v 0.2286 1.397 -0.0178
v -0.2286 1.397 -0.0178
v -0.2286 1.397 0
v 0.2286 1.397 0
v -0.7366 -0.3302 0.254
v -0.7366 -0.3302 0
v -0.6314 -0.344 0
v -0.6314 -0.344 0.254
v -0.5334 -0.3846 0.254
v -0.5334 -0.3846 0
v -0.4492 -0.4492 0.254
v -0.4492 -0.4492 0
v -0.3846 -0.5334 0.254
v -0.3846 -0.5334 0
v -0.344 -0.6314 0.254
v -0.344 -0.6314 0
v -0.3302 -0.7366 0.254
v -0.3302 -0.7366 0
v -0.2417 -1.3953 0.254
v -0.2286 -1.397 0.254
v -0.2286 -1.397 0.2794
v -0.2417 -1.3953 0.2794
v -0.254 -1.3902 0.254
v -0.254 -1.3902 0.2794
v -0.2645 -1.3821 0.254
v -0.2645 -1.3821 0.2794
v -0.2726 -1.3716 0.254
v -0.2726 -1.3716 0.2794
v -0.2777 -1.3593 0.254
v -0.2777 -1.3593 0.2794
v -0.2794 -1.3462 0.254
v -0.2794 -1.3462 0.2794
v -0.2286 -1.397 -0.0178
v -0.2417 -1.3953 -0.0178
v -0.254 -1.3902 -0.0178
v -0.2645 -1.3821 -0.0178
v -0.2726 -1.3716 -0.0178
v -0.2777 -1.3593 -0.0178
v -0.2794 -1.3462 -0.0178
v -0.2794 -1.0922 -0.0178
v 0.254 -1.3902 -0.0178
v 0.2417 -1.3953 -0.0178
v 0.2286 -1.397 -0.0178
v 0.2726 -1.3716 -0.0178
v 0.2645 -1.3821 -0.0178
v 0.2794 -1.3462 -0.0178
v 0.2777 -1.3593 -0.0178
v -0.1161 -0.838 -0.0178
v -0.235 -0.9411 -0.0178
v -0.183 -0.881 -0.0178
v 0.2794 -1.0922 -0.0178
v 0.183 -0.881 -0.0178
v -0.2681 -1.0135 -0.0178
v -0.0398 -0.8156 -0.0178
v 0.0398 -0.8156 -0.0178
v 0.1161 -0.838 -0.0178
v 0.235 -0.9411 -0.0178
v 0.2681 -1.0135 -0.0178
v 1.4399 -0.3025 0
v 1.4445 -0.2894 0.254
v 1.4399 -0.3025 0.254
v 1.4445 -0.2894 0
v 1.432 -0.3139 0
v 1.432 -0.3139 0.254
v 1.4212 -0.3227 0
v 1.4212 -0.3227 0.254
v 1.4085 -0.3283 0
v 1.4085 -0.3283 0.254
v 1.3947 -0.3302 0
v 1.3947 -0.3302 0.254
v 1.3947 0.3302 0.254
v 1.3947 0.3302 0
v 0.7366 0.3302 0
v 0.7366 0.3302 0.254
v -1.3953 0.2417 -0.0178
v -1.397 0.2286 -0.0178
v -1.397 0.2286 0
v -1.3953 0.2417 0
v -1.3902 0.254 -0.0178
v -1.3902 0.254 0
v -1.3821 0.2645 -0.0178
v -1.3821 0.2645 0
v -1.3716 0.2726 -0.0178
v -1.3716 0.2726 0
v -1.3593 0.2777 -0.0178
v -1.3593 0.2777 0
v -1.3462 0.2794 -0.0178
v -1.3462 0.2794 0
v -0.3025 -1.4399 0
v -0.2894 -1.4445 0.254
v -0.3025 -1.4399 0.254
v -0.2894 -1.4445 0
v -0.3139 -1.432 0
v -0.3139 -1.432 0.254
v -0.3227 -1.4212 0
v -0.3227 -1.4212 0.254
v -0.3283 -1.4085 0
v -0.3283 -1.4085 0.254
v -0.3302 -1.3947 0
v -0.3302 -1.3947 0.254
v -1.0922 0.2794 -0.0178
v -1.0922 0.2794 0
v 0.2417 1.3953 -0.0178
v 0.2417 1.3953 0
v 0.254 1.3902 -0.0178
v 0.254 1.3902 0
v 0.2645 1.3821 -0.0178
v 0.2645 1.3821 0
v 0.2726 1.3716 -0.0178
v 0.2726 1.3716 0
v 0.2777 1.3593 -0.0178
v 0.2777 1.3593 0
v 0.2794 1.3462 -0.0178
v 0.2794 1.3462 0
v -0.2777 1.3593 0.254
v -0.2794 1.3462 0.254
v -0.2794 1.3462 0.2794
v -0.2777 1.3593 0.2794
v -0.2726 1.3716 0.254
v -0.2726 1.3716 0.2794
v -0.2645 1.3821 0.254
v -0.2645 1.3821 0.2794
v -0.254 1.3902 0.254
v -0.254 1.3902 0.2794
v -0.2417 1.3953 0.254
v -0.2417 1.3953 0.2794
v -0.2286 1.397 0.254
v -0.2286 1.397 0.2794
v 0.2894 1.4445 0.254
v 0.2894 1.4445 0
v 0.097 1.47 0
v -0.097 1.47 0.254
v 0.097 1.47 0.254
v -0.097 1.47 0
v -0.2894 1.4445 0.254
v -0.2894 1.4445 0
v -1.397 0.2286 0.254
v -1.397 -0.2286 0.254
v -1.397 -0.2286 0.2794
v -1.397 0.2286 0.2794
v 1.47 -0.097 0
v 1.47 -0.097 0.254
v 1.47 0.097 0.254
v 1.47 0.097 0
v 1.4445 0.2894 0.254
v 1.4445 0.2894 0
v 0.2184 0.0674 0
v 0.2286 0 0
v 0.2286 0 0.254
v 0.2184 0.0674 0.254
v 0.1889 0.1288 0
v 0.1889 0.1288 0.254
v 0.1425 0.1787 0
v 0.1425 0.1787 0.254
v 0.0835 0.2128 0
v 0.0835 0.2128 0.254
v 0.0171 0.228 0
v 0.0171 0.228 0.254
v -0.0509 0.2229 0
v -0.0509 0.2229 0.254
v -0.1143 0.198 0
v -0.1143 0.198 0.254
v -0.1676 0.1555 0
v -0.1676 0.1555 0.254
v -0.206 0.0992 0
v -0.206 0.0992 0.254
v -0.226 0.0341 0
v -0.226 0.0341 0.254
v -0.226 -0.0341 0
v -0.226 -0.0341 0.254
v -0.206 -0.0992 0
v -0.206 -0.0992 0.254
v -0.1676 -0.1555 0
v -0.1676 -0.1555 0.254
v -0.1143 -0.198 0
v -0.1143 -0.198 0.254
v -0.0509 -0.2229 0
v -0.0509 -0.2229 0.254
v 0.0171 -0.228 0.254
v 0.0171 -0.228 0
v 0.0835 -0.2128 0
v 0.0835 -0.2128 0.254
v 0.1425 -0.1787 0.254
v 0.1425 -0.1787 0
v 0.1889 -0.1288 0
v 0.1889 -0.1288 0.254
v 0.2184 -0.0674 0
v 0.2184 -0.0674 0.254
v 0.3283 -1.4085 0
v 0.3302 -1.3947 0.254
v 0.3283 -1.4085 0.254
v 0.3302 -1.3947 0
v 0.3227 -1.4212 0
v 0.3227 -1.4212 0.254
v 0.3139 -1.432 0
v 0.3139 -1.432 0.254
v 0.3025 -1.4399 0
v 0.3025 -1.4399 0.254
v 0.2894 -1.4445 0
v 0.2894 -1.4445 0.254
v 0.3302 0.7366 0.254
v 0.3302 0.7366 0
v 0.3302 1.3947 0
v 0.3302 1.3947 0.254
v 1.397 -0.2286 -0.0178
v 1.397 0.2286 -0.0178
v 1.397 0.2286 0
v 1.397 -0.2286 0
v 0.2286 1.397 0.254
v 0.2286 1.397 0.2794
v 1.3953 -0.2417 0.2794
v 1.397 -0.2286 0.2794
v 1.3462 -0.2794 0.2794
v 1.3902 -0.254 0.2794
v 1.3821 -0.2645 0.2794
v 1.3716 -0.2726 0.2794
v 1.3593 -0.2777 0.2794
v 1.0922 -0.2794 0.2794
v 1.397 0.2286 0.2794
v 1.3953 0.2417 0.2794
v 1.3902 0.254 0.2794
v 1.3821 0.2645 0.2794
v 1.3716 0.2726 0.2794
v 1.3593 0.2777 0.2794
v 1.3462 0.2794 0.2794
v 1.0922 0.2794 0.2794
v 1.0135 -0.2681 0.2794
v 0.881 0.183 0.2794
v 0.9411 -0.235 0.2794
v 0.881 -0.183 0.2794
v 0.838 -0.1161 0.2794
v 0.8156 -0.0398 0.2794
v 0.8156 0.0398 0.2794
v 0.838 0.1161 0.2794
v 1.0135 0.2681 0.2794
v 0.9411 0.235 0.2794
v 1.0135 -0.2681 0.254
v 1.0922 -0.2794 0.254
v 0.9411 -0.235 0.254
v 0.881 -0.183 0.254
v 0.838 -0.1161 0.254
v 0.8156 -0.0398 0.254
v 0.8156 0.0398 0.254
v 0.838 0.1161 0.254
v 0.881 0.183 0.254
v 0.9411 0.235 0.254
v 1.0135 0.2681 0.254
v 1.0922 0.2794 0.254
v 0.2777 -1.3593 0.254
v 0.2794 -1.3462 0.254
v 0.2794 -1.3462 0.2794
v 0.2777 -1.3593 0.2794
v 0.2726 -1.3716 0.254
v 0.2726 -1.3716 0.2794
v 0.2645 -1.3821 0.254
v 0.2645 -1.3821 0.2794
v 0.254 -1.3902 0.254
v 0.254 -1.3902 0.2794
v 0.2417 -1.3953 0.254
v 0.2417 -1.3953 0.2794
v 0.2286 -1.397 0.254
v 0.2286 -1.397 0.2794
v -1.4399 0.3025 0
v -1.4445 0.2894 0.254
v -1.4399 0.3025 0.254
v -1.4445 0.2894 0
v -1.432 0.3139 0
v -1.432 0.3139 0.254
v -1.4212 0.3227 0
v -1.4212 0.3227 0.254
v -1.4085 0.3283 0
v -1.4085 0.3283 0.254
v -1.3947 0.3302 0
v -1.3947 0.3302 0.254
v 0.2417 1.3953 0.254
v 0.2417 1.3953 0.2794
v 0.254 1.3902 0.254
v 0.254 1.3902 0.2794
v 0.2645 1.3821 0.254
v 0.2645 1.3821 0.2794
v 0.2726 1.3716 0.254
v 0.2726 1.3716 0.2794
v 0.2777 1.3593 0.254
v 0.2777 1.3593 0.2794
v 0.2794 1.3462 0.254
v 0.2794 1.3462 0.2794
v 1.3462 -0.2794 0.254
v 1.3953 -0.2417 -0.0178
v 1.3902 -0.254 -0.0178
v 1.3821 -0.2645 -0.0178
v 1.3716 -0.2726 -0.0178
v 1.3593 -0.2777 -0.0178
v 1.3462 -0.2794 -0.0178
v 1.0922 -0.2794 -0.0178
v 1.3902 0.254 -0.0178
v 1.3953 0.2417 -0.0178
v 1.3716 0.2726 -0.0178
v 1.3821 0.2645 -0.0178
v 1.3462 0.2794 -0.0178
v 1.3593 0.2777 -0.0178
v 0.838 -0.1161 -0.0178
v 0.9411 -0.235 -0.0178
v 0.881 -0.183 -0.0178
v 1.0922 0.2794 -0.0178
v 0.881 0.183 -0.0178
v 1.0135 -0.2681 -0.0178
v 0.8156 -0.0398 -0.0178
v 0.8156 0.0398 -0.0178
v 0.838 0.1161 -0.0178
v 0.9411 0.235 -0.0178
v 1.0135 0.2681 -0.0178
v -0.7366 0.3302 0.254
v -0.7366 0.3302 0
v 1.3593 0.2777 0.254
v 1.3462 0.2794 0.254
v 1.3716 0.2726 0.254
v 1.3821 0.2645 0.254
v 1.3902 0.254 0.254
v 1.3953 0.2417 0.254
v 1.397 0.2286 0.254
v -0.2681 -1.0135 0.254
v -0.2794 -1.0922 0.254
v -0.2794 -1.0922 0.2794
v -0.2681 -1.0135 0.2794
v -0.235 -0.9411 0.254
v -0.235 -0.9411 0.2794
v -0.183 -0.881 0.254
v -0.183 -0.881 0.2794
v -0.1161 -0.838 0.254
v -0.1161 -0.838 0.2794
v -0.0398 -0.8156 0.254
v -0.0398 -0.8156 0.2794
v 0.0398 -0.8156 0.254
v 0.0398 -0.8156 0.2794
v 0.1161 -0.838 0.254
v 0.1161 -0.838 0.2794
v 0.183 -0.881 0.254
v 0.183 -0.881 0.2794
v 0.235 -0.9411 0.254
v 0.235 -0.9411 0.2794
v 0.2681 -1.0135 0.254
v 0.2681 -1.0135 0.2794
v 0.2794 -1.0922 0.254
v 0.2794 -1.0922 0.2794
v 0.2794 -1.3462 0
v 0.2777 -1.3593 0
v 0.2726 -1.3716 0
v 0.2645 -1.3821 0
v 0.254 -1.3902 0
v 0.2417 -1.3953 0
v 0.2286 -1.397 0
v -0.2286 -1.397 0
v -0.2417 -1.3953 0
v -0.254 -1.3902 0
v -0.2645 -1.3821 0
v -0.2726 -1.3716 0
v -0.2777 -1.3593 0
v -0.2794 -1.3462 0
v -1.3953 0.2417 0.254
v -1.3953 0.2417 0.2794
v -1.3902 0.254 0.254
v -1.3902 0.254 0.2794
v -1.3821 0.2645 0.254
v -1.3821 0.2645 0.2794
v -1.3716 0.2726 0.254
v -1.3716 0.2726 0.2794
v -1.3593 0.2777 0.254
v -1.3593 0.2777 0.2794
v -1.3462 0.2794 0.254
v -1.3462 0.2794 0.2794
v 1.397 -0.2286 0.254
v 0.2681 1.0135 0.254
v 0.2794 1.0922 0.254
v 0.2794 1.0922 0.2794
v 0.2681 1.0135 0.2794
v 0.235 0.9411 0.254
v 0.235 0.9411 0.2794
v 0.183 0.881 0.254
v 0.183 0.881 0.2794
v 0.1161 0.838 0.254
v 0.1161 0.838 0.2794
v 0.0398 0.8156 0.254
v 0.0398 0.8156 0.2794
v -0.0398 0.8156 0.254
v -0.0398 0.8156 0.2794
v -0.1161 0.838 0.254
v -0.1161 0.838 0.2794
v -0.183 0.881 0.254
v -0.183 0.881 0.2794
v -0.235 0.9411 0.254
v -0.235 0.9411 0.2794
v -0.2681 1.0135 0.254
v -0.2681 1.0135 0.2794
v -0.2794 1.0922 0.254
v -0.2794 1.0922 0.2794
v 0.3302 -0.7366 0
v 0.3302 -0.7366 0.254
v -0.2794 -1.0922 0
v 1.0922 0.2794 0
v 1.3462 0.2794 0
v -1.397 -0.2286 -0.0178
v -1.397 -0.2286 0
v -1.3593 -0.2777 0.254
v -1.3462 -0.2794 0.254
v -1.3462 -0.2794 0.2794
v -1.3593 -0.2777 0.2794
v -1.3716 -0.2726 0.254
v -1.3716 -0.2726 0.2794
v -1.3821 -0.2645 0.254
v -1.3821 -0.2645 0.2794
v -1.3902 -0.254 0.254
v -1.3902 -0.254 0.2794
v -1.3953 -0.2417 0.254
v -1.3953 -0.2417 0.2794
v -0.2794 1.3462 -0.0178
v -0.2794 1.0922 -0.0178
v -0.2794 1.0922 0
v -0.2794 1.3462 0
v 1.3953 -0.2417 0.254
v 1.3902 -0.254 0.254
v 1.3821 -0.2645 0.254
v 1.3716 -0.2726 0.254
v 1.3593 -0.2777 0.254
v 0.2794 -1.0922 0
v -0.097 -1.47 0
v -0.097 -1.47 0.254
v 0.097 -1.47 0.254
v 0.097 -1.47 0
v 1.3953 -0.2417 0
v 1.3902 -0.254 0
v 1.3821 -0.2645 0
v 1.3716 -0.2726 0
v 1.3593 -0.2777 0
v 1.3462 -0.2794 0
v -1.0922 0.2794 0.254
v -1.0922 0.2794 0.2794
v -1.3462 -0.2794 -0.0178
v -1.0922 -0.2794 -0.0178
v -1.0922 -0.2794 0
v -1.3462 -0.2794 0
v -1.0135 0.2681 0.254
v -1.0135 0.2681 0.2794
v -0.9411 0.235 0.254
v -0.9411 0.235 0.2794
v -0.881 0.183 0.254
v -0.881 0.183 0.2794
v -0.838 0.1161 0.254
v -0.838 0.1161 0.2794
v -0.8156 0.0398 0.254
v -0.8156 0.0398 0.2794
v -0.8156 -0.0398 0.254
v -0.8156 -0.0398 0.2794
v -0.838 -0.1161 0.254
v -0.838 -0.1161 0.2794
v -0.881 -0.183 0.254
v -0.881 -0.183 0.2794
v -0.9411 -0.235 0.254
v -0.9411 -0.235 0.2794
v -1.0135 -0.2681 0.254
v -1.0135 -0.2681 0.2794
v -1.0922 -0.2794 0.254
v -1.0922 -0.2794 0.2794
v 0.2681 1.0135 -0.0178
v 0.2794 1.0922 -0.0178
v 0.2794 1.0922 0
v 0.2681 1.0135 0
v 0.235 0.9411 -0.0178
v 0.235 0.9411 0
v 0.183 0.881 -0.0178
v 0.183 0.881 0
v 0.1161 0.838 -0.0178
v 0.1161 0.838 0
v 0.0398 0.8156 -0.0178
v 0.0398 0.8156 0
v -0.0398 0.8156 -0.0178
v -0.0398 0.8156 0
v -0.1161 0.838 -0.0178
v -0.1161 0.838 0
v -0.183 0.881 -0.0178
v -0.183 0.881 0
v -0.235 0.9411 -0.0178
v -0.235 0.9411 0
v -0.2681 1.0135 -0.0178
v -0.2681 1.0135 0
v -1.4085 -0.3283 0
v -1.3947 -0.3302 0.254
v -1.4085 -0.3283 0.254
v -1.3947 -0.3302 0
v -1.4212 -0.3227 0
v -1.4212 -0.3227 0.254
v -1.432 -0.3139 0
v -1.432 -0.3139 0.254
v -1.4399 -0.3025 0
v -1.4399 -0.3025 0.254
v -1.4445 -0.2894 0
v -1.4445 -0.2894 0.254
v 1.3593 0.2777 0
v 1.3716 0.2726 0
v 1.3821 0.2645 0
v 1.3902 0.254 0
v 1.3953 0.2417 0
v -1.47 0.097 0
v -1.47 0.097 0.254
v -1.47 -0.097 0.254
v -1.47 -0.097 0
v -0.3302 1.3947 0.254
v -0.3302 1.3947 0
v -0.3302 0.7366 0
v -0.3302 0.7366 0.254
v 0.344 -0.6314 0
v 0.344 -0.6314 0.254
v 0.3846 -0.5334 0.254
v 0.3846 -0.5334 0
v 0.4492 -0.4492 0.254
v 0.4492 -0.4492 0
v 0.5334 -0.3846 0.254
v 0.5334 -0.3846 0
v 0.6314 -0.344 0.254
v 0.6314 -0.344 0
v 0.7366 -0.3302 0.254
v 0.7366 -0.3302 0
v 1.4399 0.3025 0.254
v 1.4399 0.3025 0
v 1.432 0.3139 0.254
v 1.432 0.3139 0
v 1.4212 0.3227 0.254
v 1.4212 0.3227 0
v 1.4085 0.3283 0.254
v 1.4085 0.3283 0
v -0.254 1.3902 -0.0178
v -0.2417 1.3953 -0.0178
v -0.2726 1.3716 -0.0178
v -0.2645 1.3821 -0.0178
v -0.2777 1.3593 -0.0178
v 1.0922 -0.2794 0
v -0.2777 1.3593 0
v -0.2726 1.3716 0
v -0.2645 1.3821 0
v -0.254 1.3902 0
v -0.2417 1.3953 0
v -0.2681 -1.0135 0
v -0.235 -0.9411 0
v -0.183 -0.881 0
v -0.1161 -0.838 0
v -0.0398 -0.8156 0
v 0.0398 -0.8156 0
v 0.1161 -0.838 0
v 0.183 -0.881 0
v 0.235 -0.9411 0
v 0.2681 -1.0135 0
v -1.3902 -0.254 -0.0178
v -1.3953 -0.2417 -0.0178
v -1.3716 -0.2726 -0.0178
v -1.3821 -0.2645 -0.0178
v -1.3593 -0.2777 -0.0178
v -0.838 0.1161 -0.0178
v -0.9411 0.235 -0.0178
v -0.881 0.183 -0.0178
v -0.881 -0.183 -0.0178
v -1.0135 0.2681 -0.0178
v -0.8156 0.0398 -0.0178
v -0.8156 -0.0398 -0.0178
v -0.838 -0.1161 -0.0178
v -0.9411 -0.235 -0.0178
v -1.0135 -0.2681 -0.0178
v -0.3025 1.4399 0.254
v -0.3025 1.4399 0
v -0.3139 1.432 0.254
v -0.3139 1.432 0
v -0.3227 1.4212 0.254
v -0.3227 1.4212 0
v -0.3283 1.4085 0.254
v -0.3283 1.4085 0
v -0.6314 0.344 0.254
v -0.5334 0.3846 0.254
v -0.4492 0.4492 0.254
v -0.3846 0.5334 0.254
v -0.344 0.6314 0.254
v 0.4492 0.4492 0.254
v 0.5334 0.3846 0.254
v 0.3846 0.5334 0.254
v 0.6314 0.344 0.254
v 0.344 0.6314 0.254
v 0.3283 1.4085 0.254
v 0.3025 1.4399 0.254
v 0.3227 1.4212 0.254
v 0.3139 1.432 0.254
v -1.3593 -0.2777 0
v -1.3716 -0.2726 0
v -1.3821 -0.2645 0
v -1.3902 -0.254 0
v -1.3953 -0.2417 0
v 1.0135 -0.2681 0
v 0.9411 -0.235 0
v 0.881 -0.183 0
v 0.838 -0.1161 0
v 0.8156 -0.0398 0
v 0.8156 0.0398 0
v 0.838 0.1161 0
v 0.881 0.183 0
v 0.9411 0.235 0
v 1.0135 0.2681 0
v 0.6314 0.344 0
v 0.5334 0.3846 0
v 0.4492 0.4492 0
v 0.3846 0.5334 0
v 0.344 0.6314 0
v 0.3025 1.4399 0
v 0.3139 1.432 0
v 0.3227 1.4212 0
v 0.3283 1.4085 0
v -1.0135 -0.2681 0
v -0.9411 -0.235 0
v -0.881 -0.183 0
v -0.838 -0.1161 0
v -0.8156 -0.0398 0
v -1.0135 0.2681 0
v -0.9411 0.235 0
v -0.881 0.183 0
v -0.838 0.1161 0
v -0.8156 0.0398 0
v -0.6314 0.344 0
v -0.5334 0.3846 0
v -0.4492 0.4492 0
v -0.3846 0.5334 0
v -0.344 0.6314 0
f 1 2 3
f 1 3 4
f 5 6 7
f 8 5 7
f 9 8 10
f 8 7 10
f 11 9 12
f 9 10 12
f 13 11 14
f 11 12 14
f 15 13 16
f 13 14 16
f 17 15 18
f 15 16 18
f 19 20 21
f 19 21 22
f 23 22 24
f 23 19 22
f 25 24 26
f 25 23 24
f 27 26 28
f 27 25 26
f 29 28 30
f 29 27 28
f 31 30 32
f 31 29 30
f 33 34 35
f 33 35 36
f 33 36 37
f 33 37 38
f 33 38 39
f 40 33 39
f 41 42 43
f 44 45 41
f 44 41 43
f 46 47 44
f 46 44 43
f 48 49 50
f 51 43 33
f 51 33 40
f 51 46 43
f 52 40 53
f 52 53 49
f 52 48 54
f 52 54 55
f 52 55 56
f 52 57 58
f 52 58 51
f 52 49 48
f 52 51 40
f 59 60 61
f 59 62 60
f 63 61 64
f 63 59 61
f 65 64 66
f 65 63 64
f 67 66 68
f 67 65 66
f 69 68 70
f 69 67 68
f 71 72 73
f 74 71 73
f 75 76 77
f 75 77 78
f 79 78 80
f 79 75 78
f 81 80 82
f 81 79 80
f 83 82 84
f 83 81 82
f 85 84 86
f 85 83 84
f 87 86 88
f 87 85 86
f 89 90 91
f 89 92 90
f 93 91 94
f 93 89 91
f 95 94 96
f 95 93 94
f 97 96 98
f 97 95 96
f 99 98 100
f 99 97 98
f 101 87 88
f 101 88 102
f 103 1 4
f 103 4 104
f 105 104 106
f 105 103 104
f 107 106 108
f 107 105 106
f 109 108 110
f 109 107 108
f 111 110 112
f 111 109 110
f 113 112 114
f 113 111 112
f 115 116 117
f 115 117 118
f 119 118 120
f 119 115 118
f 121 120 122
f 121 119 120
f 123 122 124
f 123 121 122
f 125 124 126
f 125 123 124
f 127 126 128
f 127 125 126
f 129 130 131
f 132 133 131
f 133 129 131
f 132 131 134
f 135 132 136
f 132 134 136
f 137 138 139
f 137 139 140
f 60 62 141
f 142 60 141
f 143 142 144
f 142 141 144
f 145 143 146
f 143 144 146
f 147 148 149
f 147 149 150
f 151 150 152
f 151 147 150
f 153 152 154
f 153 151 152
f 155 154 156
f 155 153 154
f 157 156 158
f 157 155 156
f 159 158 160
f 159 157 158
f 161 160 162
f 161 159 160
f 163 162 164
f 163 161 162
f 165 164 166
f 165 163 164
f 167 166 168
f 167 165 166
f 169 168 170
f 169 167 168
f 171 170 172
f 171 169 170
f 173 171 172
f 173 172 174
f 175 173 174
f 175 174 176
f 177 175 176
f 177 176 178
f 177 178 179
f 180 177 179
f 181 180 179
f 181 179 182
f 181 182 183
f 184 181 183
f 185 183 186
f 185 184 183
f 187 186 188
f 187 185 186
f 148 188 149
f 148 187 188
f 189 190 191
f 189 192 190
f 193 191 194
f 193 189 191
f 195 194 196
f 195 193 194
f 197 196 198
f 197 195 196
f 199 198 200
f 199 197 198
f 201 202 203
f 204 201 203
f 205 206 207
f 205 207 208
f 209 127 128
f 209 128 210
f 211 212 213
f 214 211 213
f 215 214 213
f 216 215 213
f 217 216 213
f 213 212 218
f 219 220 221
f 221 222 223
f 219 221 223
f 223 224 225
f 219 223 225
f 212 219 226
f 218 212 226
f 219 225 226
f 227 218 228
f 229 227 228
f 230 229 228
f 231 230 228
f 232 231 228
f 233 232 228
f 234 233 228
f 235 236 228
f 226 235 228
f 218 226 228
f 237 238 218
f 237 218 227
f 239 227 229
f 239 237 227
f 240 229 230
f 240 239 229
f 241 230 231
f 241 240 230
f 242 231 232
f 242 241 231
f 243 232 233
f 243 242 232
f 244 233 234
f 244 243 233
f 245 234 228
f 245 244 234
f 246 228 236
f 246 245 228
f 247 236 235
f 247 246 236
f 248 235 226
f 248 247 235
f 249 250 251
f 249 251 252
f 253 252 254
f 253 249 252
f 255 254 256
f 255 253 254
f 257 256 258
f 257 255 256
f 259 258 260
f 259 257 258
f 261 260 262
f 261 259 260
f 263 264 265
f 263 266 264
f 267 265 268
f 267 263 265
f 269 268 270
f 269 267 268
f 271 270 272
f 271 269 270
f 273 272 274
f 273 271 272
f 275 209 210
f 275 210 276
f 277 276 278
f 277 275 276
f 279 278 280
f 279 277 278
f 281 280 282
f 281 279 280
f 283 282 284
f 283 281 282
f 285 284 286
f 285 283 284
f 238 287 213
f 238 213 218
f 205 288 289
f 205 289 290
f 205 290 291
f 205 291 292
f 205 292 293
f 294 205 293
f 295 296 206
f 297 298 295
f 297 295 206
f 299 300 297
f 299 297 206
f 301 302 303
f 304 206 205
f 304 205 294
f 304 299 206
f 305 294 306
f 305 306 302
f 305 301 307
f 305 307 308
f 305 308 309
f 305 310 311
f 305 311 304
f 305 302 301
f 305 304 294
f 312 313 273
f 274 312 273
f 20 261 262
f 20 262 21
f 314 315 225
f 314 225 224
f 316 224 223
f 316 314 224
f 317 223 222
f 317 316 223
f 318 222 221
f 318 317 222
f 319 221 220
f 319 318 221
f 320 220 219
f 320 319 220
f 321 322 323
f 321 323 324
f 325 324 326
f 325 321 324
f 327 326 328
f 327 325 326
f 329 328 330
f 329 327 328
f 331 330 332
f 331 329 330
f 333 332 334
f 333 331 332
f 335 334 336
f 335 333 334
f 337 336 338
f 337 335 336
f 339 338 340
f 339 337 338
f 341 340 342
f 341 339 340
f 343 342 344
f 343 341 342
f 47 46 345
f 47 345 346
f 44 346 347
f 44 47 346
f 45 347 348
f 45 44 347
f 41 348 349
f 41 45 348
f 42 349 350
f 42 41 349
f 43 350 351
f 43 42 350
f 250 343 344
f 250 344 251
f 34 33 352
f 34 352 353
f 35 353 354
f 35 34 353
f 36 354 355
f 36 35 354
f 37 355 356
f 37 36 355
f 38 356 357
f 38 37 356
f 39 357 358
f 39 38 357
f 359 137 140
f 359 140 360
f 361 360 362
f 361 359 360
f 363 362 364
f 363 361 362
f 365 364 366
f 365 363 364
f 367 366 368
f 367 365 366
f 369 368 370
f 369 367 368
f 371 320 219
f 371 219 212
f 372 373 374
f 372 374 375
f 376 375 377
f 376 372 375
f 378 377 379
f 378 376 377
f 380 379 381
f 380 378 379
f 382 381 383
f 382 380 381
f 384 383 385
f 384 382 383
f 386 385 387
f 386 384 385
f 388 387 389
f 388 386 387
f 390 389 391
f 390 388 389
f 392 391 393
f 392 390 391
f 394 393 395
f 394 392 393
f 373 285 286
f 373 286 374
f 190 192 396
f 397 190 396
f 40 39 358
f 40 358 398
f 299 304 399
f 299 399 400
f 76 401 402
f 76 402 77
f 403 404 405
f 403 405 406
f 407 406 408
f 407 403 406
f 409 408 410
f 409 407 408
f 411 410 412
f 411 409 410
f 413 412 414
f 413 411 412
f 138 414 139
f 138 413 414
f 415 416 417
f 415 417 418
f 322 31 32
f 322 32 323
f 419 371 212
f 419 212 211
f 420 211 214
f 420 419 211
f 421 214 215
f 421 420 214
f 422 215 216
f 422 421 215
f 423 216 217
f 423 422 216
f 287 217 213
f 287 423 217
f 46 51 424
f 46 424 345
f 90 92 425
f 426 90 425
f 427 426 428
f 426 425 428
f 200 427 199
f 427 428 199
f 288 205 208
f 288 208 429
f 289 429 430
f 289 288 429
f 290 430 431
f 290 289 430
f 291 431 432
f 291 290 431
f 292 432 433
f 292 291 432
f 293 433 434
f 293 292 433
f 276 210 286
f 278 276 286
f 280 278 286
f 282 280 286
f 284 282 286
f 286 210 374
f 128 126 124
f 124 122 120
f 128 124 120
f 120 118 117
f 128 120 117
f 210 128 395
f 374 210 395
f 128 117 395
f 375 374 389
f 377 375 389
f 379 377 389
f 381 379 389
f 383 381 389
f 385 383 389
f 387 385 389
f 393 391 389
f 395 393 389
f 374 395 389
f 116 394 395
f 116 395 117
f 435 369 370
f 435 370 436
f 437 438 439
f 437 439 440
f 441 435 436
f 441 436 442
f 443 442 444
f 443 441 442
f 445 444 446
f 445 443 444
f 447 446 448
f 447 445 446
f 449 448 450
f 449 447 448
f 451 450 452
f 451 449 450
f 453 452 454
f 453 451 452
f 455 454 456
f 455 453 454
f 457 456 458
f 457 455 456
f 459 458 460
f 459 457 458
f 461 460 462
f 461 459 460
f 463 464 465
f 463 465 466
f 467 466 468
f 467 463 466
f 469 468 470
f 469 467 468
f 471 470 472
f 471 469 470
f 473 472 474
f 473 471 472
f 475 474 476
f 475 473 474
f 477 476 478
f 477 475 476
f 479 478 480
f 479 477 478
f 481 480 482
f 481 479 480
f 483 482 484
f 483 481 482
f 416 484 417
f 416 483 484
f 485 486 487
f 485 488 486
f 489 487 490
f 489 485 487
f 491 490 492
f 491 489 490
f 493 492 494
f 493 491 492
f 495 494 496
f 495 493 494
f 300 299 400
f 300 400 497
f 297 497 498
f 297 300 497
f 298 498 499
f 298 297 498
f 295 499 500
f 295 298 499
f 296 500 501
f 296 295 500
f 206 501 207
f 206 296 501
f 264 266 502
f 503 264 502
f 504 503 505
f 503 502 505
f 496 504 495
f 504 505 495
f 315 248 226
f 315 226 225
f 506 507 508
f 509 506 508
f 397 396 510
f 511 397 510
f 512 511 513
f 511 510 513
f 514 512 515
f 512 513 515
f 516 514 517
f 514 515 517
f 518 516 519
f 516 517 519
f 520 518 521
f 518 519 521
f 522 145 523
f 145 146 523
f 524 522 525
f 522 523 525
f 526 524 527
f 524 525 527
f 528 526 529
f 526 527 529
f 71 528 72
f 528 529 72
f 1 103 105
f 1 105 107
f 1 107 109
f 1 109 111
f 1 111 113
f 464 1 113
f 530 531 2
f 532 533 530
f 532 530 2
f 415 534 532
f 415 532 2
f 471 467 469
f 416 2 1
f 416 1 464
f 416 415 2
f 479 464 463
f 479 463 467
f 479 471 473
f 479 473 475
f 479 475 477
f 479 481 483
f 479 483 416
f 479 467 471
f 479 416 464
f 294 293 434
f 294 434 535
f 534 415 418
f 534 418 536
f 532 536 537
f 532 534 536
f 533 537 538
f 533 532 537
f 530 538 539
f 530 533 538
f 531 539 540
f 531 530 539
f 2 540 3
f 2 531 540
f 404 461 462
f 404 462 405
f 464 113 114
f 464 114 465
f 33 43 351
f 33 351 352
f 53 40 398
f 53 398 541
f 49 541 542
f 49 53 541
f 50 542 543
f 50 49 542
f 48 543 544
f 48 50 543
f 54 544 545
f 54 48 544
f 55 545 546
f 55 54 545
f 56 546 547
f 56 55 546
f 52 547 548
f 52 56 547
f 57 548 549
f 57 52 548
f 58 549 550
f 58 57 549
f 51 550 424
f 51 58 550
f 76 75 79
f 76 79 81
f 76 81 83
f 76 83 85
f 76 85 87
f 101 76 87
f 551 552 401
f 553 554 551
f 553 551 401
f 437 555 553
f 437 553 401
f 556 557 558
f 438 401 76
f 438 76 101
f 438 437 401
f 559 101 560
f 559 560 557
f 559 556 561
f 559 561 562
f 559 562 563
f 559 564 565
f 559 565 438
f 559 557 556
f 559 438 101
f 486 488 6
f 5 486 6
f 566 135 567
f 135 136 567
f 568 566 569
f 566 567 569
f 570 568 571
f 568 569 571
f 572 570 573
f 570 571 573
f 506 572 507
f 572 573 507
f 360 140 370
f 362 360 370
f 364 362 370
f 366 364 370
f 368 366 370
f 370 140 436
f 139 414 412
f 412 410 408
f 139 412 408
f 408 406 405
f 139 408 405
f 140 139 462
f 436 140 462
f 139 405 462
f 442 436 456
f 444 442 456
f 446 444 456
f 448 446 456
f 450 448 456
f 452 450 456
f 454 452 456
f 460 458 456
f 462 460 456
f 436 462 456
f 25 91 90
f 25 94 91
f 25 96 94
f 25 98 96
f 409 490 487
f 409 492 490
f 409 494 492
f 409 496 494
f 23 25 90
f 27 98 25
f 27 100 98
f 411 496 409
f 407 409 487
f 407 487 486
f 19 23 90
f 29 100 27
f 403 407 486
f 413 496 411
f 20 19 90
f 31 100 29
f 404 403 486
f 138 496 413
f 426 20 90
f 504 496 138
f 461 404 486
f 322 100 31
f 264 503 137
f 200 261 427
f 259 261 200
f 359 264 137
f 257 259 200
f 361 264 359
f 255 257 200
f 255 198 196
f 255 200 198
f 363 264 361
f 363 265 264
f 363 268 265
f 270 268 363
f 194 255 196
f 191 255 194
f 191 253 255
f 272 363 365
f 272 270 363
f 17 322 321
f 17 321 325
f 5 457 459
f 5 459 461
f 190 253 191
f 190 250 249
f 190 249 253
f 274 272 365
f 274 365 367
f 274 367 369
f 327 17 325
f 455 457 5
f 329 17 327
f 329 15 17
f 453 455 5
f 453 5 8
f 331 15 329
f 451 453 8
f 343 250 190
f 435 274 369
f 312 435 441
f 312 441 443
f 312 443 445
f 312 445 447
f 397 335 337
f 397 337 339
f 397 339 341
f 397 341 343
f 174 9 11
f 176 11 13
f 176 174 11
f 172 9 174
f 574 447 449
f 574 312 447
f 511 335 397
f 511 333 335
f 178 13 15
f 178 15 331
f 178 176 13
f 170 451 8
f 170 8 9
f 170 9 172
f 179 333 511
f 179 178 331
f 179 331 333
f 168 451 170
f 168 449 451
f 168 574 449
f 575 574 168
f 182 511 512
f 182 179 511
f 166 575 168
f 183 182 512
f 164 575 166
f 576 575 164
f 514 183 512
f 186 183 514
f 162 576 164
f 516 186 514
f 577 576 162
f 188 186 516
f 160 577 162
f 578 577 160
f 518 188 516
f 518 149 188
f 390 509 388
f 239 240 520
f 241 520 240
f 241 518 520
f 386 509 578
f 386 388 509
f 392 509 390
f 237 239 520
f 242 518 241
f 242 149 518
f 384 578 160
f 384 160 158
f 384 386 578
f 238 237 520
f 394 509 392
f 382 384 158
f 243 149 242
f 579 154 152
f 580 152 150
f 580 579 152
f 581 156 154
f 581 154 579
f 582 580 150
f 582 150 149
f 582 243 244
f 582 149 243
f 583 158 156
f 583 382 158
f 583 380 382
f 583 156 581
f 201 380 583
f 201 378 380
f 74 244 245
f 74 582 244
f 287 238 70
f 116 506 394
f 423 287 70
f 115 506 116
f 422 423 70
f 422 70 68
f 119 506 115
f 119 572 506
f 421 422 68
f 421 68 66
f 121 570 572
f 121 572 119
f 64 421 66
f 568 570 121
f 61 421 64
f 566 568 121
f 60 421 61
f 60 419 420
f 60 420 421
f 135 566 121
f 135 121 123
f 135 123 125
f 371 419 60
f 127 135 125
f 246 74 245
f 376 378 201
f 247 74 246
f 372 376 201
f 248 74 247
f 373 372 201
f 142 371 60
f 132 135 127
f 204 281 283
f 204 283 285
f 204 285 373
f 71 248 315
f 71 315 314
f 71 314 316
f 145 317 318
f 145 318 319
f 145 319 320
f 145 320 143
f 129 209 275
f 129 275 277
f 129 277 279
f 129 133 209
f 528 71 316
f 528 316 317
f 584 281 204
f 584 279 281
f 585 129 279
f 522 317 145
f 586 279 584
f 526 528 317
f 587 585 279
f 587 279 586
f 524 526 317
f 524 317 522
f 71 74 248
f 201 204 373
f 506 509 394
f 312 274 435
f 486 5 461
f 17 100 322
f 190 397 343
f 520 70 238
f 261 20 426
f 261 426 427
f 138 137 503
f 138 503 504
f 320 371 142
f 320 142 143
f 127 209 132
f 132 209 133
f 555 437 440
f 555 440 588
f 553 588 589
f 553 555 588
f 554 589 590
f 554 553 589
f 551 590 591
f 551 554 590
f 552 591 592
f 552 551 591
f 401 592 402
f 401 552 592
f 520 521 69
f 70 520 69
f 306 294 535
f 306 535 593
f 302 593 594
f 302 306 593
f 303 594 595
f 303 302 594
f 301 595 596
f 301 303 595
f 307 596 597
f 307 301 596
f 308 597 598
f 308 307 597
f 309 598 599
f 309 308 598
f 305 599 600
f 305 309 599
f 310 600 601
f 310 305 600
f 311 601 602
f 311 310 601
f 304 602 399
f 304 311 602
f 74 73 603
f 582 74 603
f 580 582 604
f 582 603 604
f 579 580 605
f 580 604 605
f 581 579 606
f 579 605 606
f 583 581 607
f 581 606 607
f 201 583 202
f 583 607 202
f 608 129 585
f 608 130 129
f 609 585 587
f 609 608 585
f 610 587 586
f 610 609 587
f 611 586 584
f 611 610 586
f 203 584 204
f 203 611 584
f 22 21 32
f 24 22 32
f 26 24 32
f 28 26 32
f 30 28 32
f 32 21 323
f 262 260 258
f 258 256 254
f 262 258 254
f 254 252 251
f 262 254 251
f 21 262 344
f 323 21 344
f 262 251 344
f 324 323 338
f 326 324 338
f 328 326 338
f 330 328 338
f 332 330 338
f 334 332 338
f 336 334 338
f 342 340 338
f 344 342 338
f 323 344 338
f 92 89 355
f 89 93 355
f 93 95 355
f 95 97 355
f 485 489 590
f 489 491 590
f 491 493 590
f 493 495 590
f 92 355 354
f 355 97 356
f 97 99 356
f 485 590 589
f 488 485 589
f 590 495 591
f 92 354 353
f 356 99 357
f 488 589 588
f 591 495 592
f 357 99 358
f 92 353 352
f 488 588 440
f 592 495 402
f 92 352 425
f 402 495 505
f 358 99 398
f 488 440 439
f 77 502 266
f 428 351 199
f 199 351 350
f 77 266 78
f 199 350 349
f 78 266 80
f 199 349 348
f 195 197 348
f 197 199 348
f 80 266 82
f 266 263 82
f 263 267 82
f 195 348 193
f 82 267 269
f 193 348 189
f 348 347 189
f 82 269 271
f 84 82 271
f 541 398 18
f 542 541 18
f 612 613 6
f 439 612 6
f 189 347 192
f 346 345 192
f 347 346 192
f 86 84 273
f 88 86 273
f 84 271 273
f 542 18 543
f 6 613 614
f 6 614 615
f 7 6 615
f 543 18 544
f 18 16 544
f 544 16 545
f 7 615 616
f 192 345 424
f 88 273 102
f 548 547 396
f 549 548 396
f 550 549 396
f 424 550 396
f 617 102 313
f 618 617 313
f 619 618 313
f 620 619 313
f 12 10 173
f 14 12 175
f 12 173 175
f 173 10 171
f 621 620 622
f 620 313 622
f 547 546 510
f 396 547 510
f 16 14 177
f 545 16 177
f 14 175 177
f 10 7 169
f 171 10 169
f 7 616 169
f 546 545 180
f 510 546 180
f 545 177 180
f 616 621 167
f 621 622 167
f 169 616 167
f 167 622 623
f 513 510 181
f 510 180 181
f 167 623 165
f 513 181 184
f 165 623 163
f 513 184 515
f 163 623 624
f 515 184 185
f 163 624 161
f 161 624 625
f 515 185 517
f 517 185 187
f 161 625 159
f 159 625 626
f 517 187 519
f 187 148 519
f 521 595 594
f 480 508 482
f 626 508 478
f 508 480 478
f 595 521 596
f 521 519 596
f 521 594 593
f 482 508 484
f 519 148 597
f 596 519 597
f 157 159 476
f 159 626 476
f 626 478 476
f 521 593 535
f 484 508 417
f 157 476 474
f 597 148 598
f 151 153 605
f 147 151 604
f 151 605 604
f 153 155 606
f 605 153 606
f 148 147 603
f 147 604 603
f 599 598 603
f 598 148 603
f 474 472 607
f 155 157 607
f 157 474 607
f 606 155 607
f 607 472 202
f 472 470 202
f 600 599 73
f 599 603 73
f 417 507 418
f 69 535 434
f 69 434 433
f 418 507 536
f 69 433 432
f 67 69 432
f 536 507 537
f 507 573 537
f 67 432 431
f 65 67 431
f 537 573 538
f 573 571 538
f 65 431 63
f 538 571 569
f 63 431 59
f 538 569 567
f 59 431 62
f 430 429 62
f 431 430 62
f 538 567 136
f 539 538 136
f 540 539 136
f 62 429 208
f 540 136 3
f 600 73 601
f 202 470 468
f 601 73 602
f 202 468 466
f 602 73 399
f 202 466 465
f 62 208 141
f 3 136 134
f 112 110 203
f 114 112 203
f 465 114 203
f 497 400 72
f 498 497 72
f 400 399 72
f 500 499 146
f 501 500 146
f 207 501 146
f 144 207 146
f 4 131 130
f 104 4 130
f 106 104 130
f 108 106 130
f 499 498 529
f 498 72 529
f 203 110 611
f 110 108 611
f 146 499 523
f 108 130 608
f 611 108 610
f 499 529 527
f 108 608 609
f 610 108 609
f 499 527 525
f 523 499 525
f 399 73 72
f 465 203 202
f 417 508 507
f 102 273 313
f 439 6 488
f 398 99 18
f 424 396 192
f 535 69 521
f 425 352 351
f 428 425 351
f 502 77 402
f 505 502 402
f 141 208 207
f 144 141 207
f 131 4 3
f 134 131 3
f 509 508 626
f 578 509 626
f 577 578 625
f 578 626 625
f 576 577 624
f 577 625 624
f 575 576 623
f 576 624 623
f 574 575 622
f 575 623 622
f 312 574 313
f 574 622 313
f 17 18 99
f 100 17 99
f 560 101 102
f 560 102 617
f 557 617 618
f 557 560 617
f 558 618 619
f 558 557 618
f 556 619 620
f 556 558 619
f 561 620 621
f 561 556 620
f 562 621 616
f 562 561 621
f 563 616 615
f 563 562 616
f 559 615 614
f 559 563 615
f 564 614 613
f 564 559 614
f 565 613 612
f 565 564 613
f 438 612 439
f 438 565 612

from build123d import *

# Parameters (mm, degrees)
SKETCH1_R                = 1.4732
SKETCH1_R_2              = 0.2286
BOSS_EXTRUDE1_DEPTH      = 0.254
CUT_EXTRUDE3_DEPTH       = 3.098845511
FILLET1_R                = 0.0508
CIRPATTERN2_COUNT        = 4
FILLET1_OF_CIRPATTERN2_R = 0.0508
BOSS_EXTRUDE2_DEPTH      = 0.0254
BOSS_EXTRUDE4_START      = 0.01778
BOSS_EXTRUDE4_DEPTH      = 0.01778
CIRPATTERN1_COUNT        = 4


with BuildPart() as part:
    # Sketch1 → Boss-Extrude1 (new body)
    with BuildSketch(Plane.XY):
        Circle(SKETCH1_R)
        Circle(SKETCH1_R_2, mode=Mode.SUBTRACT)
    extrude(amount=BOSS_EXTRUDE1_DEPTH)

    # Sketch11 → Cut-Extrude3 (cut, through all)
    with BuildSketch(Plane.XY):
        with BuildLine():
            Line((2.543481959, 0.3302), (0.7366, 0.3302))
            ThreePointArc((0.7366, 0.3302), (0.449231804, 0.449231804), (0.3302, 0.7366))
            Line((0.3302, 0.7366), (0.3302, 2.543481959))
            Line((0.3302, 2.543481959), (2.543481959, 0.3302))
        make_face()
    cut_extrude3 = extrude(amount=CUT_EXTRUDE3_DEPTH, mode=Mode.SUBTRACT)

    # Fillet1
    fillet1_edges = [part.edges().sort_by_distance(p)[0] for p in [
        (1.435718009, 0.3302, 0.127),
        (0.3302, 1.435718009, 0.127),
    ]]
    fillet(fillet1_edges, radius=FILLET1_R)

    # CirPattern2: Cut-Extrude3 ×4 about axis
    cirpattern2_axis = Axis((0, 0, -0.05461), (0, 0, 1))
    for i in range(1, CIRPATTERN2_COUNT):
        add(cut_extrude3.rotate(cirpattern2_axis, i * 360 / CIRPATTERN2_COUNT), mode=Mode.SUBTRACT)

    # Fillet1 of CirPattern2
    fillet1_of_cirpattern2_edges = [part.edges().sort_by_distance(p)[0] for p in [
        (-0.3302, 1.435718009, 0.127),
        (-1.435718009, 0.3302, 0.127),
        (-1.435718009, -0.3302, 0.127),
        (-0.3302, -1.435718009, 0.127),
        (0.3302, -1.435718009, 0.127),
        (1.435718009, -0.3302, 0.127),
    ]]
    fillet(fillet1_of_cirpattern2_edges, radius=FILLET1_OF_CIRPATTERN2_R)

    # Sketch2 → Boss-Extrude2 (add)
    with BuildSketch(Plane.XY.offset(0.254)):
        with BuildLine():
            Line((1.0922, 0.2794), (1.3462, 0.2794))
            ThreePointArc((1.3462, 0.2794), (1.382121024, 0.264521024), (1.397, 0.2286))
            Line((1.397, 0.2286), (1.397, -0.2286))
            ThreePointArc((1.397, -0.2286), (1.382121024, -0.264521024), (1.3462, -0.2794))
            Line((1.3462, -0.2794), (1.0922, -0.2794))
            ThreePointArc((1.0922, -0.2794), (0.8128, 0), (1.0922, 0.2794))
        make_face()
    boss_extrude2 = extrude(amount=BOSS_EXTRUDE2_DEPTH)

    # Sketch5 → Boss-Extrude4 (add)
    with BuildSketch(Plane(origin=(0, 0, 0), x_dir=(-1, 0, 0), z_dir=(0, 0, -1)).offset(BOSS_EXTRUDE4_START)):
        with BuildLine():
            Line((-1.397, 0.2286), (-1.397, -0.2286))
            ThreePointArc((-1.397, -0.2286), (-1.382121024, -0.264521024), (-1.3462, -0.2794))
            Line((-1.3462, -0.2794), (-1.0922, -0.2794))
            ThreePointArc((-1.0922, -0.2794), (-0.8128, 0), (-1.0922, 0.2794))
            Line((-1.0922, 0.2794), (-1.3462, 0.2794))
            ThreePointArc((-1.3462, 0.2794), (-1.382121024, 0.264521024), (-1.397, 0.2286))
        make_face()
    boss_extrude4 = extrude(amount=-BOSS_EXTRUDE4_DEPTH)

    # CirPattern1: Boss-Extrude2, Boss-Extrude4 ×4 about axis
    cirpattern1_axis = Axis((0, 0, -0.05461), (0, 0, 1))
    add([boss_extrude2.rotate(cirpattern1_axis, i * 360 / CIRPATTERN1_COUNT) for i in range(1, CIRPATTERN1_COUNT)])
    add([boss_extrude4.rotate(cirpattern1_axis, i * 360 / CIRPATTERN1_COUNT) for i in range(1, CIRPATTERN1_COUNT)])


solid = part.part
